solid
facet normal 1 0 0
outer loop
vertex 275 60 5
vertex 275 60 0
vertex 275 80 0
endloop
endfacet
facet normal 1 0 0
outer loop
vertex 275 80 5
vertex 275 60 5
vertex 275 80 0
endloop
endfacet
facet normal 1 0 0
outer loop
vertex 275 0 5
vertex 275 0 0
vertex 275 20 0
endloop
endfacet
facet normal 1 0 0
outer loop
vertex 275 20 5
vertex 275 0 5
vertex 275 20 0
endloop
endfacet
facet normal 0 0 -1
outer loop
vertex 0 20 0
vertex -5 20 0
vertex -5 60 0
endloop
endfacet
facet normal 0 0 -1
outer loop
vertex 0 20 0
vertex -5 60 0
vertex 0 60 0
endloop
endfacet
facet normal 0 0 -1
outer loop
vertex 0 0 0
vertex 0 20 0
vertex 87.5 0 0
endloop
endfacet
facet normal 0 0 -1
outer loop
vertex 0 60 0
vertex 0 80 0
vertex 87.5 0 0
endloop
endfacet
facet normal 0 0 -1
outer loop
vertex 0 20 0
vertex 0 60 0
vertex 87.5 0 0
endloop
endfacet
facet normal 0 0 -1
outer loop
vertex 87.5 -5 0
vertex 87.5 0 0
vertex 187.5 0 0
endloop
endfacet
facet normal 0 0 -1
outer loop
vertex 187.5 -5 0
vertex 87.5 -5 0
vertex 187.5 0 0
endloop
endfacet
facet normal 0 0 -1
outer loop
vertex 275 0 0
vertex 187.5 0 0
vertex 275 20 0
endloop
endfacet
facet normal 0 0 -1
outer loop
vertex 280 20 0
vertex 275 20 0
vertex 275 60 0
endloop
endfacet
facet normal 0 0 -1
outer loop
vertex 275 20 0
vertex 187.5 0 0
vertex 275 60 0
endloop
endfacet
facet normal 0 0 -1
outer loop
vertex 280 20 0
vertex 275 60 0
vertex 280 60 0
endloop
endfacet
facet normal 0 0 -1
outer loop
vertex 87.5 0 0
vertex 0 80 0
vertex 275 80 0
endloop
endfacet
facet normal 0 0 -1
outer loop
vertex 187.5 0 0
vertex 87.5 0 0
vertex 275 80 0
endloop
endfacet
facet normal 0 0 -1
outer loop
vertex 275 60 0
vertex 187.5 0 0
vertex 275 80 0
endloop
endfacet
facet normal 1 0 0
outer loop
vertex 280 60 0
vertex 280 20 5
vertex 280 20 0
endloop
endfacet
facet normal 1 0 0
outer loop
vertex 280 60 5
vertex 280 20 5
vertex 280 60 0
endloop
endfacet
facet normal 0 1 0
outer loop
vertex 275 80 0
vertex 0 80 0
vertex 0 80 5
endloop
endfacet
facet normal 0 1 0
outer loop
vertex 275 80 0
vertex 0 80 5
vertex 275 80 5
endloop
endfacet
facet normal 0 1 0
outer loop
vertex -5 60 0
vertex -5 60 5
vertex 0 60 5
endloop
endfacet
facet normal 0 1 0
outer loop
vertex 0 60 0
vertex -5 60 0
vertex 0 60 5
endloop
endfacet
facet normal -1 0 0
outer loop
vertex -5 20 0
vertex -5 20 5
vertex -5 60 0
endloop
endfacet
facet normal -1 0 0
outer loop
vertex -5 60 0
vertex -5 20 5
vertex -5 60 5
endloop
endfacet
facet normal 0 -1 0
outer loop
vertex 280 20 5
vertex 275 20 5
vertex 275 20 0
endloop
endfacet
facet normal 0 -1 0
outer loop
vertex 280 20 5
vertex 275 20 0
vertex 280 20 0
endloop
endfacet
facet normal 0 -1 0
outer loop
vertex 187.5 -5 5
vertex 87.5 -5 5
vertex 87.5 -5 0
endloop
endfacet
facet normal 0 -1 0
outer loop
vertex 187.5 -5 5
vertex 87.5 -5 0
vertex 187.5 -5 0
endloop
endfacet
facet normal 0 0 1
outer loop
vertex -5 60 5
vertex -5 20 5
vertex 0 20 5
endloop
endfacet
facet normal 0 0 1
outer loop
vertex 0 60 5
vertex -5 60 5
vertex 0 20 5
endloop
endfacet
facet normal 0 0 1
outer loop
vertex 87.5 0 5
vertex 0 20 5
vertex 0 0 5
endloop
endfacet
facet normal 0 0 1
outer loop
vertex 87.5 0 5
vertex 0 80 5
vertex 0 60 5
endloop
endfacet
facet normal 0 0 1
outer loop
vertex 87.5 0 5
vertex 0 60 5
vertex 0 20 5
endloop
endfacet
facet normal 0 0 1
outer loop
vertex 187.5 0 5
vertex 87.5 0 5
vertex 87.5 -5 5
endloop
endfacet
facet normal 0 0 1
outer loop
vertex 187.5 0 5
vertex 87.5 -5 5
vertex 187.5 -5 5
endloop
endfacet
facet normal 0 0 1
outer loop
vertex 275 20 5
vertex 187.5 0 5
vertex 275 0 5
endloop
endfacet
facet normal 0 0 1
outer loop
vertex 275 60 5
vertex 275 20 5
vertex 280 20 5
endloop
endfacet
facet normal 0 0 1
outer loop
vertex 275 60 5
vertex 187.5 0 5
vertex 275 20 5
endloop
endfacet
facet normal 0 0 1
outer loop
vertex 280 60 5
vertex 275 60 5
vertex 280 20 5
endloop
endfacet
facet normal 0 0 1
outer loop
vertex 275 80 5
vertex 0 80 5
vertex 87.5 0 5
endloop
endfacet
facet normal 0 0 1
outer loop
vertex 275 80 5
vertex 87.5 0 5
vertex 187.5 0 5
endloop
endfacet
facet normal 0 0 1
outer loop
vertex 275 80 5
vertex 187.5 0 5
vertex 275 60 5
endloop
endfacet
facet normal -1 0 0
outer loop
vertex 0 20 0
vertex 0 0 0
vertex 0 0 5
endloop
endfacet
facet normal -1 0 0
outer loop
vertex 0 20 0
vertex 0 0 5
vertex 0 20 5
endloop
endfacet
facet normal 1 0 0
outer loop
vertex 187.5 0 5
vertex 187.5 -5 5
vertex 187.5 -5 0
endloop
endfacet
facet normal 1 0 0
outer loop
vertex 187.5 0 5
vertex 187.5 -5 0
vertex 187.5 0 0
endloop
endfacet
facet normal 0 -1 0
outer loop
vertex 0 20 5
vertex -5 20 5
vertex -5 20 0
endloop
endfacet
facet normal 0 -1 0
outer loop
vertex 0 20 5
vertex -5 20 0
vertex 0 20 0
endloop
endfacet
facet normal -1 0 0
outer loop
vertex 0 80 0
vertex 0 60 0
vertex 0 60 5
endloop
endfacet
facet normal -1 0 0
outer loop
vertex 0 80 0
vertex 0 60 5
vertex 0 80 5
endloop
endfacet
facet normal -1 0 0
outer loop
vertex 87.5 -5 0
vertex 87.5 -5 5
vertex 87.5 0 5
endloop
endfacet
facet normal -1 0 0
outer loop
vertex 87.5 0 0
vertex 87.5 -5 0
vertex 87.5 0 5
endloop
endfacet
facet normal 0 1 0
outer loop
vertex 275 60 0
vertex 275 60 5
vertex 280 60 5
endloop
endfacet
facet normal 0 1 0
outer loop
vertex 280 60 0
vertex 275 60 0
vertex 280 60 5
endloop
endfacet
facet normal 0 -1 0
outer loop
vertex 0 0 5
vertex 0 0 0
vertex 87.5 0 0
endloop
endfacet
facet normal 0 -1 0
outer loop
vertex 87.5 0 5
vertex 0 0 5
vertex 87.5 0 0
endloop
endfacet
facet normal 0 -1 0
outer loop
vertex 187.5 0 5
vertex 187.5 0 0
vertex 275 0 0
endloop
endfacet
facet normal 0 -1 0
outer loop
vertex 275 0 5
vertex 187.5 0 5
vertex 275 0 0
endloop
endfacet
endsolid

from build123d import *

# Parameters (mm, degrees)
SKIZZE1_W                       = 275
SKIZZE1_H                       = 80
AUFSATZ_LINEAR_AUSTRAGEN1_DEPTH = 5
SKIZZE2_W                       = 100
SKIZZE2_H                       = 5
AUFSATZ_LINEAR_AUSTRAGEN2_DEPTH = 5
SKIZZE3_W                       = 5
SKIZZE3_H                       = 40
AUFSATZ_LINEAR_AUSTRAGEN3_DEPTH = 5


with BuildPart() as part:
    # Skizze1 → Aufsatz-Linear austragen1 (new body)
    with BuildSketch(Plane.XY):
        with Locations((137.5, 40)):
            Rectangle(SKIZZE1_W, SKIZZE1_H)
    extrude(amount=AUFSATZ_LINEAR_AUSTRAGEN1_DEPTH)

    # Skizze2 → Aufsatz-Linear austragen2 (add, through all)
    with BuildSketch(Plane.XY.offset(5)):
        with Locations((137.5, -2.5)):
            Rectangle(SKIZZE2_W, SKIZZE2_H)
    extrude(amount=-AUFSATZ_LINEAR_AUSTRAGEN2_DEPTH)

    # Skizze3 → Aufsatz-Linear austragen3 (add, through all)
    with BuildSketch(Plane.XY.offset(5)):
        with Locations((-2.5, 40)):
            Rectangle(SKIZZE3_W, SKIZZE3_H)
        with Locations((277.5, 40)):
            Rectangle(SKIZZE3_W, SKIZZE3_H)
    extrude(amount=-AUFSATZ_LINEAR_AUSTRAGEN3_DEPTH)


solid = part.part
